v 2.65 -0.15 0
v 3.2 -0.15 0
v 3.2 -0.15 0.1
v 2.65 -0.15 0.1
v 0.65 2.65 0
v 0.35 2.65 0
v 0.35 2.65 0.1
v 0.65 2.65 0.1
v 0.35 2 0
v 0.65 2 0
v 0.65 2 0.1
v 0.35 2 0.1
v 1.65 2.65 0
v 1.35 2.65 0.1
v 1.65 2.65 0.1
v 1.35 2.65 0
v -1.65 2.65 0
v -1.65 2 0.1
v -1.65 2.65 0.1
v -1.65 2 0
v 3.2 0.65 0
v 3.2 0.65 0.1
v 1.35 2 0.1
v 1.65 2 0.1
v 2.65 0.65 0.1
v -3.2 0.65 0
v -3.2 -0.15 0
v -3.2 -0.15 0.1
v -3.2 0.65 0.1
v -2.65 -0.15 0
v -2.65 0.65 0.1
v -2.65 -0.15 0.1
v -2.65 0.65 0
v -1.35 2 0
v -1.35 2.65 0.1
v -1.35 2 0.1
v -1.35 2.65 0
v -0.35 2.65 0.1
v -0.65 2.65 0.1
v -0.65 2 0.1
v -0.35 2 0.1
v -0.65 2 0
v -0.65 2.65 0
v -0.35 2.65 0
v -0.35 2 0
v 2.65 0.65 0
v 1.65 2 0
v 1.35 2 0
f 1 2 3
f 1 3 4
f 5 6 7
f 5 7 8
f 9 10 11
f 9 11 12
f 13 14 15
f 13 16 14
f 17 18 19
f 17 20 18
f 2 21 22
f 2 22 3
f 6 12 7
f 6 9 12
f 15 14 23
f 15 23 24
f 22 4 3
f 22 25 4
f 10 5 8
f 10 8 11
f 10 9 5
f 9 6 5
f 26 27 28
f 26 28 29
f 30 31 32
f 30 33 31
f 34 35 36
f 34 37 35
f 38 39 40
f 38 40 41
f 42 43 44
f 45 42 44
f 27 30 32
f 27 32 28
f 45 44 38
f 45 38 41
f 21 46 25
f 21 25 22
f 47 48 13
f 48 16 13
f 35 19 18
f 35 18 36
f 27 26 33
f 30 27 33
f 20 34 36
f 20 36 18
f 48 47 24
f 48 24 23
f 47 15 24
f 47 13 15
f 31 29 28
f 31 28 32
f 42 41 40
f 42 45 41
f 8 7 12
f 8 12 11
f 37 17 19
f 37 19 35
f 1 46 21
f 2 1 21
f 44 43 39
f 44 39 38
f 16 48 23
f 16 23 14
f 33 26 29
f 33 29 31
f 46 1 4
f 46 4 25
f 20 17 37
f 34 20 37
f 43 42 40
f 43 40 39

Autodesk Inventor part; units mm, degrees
ref_plane "YZ Plane" through (0, 0, 0) normal (1, 0, 0) x (0, 1, 0)
ref_plane "XZ Plane" through (0, 0, 0) normal (0, 1, 0) x (-1, 0, 0)
ref_plane "XY Plane" through (0, 0, 0) normal (0, 0, 1) x (1, 0, 0)
sketch "Sketch1" plane through (0, 0, 0) normal (0, 0, 1) x (1, 0, 0)
  line L0 (-1.65, 2.65) -> (-1.35, 2.65)
  line L1 (-1.35, 2.65) -> (-1.35, 2)
  line L2 (-1.35, 2) -> (-1.65, 2)
  line L3 (-1.65, 2) -> (-1.65, 2.65)
  line L4 (-0.65, 2.65) -> (-0.35, 2.65)
  line L5 (-0.35, 2.65) -> (-0.35, 2)
  line L6 (-0.35, 2) -> (-0.65, 2)
  line L7 (-0.65, 2) -> (-0.65, 2.65)
  line L8 (0.35, 2.65) -> (0.65, 2.65)
  line L9 (0.65, 2.65) -> (0.65, 2)
  line L10 (0.65, 2) -> (0.35, 2)
  line L11 (0.35, 2) -> (0.35, 2.65)
  line L12 (1.35, 2.65) -> (1.65, 2.65)
  line L13 (1.65, 2.65) -> (1.65, 2)
  line L14 (1.65, 2) -> (1.35, 2)
  line L15 (1.35, 2) -> (1.35, 2.65)
  line L16 (-1.5, 2) -> (-1.5, 2.65)
  line L17 (-1.65, 2.325) -> (-1.35, 2.325)
  line L18 (-0.65, 2.325) -> (-0.35, 2.325)
  line L19 (-0.5, 2) -> (-0.5, 2.65)
  line L20 (0.5, 2) -> (0.5, 2.65)
  line L21 (0.35, 2.325) -> (0.65, 2.325)
  line L22 (1.5, 2.65) -> (1.5, 2)
  line L23 (1.35, 2.325) -> (1.65, 2.325)
  line L24 (-3.2, 0.65) -> (-2.65, 0.65)
  line L25 (-2.65, 0.65) -> (-2.65, -0.15)
  line L26 (-2.65, -0.15) -> (-3.2, -0.15)
  line L27 (-3.2, -0.15) -> (-3.2, 0.65)
  line L28 (2.65, 0.65) -> (3.2, 0.65)
  line L29 (3.2, 0.65) -> (3.2, -0.15)
  line L30 (3.2, -0.15) -> (2.65, -0.15)
  line L31 (2.65, -0.15) -> (2.65, 0.65)
  line L32 (-2.925, 0.65) -> (-2.925, -0.15)
  line L33 (-3.2, 0.25) -> (-2.65, 0.25)
  line L34 (2.925, -0.15) -> (2.925, 0.65)
  line L35 (2.65, 0.25) -> (3.2, 0.25)
  line L36 (3.25, 2.15) -> (3.25, 0.5)
  line L37 (3.25, 0.5) -> (3, 0.5)
  line L38 (3, 0.5) -> (3, 0)
  line L39 (3, 0) -> (-3, 0)
  line L40 (-3, 0) -> (-3, 0.5)
  line L41 (-3, 0.5) -> (-3.25, 0.5)
  line L42 (-3.25, 0.5) -> (-3.25, 2.15)
  line L43 (-3.25, 2.15) -> (3.25, 2.15)
  line L44 (0, 0) -> (0, 2.15)
  dimension "d2" = 0.3
  dimension "d3" = 0.65
  dimension "d4" = 0.3
  dimension "d5" = 0.65
  dimension "d6" = 0.3
  dimension "d7" = 0.65
  dimension "d8" = 0.3
  dimension "d9" = 0.65
  dimension "d10" = 1
  dimension "d11" = 1
  dimension "d12" = 1
  dimension "d13" = 0.8
  dimension "d14" = 0.55
  dimension "d15" = 0.55
  dimension "d16" = 0.8
  dimension "d17" = 5.3
  dimension "d18" = 6.5
  dimension "d19" = 2.8
  dimension "d20" = 2.65
  dimension "d22" = 0.15
  dimension "d23" = 0.2
  dimension "d24" = 2.15
  dimension "d25" = 0.15
  dimension "d28" = 0.5
extrude "Extrusion1" add sketch "Sketch1" along normal blind 0.1 contours L0 L16 L17 L3 | L0 L1 L17 L16 | L17 L16 L43 L3 | L17 L1 L43 L16 | L43 L16 L2 L3 | L43 L1 L2 L16 | L43 L19 L6 L7 | L7 L18 L19 L43 | L41 L40 L33 L27 | L27 L24 L32 L33 L40 L41 | L7 L4 L19 L18 | L43 L5 L6 L19 | L19 L18 L5 L43 | L33 L40 L39 L32 L26 L27 | L19 L4 L5 L18 | L33 L32 L39 L40 | L24 L25 L33 L32 | L32 L39 L25 L26 | L33 L25 L39 L32 | L43 L20 L10 L11 | L11 L21 L20 L43 | L11 L8 L20 L21 | L43 L9 L10 L20 | L20 L21 L9 L43 | L39 L34 L30 L31 | L31 L35 L34 L39 | L20 L8 L9 L21 | L31 L28 L34 L35 | L39 L38 L35 L29 L30 L34 | L34 L35 L38 L39 | L43 L22 L14 L15 | L15 L23 L22 L43 | L34 L28 L29 L37 L38 L35 | L15 L12 L22 L23 | L43 L13 L14 L22 | L22 L23 L13 L43 | L38 L37 L29 L35 | L22 L12 L13 L23
equation "\"d15\" = d14"
equation "\"d16\" = d13"
equation "\"d20\" = 0.5 * d17"
equation "\"d28\" = 0.5 * d11"
properties part number "FH33-4S-1SH Land Pattren"
